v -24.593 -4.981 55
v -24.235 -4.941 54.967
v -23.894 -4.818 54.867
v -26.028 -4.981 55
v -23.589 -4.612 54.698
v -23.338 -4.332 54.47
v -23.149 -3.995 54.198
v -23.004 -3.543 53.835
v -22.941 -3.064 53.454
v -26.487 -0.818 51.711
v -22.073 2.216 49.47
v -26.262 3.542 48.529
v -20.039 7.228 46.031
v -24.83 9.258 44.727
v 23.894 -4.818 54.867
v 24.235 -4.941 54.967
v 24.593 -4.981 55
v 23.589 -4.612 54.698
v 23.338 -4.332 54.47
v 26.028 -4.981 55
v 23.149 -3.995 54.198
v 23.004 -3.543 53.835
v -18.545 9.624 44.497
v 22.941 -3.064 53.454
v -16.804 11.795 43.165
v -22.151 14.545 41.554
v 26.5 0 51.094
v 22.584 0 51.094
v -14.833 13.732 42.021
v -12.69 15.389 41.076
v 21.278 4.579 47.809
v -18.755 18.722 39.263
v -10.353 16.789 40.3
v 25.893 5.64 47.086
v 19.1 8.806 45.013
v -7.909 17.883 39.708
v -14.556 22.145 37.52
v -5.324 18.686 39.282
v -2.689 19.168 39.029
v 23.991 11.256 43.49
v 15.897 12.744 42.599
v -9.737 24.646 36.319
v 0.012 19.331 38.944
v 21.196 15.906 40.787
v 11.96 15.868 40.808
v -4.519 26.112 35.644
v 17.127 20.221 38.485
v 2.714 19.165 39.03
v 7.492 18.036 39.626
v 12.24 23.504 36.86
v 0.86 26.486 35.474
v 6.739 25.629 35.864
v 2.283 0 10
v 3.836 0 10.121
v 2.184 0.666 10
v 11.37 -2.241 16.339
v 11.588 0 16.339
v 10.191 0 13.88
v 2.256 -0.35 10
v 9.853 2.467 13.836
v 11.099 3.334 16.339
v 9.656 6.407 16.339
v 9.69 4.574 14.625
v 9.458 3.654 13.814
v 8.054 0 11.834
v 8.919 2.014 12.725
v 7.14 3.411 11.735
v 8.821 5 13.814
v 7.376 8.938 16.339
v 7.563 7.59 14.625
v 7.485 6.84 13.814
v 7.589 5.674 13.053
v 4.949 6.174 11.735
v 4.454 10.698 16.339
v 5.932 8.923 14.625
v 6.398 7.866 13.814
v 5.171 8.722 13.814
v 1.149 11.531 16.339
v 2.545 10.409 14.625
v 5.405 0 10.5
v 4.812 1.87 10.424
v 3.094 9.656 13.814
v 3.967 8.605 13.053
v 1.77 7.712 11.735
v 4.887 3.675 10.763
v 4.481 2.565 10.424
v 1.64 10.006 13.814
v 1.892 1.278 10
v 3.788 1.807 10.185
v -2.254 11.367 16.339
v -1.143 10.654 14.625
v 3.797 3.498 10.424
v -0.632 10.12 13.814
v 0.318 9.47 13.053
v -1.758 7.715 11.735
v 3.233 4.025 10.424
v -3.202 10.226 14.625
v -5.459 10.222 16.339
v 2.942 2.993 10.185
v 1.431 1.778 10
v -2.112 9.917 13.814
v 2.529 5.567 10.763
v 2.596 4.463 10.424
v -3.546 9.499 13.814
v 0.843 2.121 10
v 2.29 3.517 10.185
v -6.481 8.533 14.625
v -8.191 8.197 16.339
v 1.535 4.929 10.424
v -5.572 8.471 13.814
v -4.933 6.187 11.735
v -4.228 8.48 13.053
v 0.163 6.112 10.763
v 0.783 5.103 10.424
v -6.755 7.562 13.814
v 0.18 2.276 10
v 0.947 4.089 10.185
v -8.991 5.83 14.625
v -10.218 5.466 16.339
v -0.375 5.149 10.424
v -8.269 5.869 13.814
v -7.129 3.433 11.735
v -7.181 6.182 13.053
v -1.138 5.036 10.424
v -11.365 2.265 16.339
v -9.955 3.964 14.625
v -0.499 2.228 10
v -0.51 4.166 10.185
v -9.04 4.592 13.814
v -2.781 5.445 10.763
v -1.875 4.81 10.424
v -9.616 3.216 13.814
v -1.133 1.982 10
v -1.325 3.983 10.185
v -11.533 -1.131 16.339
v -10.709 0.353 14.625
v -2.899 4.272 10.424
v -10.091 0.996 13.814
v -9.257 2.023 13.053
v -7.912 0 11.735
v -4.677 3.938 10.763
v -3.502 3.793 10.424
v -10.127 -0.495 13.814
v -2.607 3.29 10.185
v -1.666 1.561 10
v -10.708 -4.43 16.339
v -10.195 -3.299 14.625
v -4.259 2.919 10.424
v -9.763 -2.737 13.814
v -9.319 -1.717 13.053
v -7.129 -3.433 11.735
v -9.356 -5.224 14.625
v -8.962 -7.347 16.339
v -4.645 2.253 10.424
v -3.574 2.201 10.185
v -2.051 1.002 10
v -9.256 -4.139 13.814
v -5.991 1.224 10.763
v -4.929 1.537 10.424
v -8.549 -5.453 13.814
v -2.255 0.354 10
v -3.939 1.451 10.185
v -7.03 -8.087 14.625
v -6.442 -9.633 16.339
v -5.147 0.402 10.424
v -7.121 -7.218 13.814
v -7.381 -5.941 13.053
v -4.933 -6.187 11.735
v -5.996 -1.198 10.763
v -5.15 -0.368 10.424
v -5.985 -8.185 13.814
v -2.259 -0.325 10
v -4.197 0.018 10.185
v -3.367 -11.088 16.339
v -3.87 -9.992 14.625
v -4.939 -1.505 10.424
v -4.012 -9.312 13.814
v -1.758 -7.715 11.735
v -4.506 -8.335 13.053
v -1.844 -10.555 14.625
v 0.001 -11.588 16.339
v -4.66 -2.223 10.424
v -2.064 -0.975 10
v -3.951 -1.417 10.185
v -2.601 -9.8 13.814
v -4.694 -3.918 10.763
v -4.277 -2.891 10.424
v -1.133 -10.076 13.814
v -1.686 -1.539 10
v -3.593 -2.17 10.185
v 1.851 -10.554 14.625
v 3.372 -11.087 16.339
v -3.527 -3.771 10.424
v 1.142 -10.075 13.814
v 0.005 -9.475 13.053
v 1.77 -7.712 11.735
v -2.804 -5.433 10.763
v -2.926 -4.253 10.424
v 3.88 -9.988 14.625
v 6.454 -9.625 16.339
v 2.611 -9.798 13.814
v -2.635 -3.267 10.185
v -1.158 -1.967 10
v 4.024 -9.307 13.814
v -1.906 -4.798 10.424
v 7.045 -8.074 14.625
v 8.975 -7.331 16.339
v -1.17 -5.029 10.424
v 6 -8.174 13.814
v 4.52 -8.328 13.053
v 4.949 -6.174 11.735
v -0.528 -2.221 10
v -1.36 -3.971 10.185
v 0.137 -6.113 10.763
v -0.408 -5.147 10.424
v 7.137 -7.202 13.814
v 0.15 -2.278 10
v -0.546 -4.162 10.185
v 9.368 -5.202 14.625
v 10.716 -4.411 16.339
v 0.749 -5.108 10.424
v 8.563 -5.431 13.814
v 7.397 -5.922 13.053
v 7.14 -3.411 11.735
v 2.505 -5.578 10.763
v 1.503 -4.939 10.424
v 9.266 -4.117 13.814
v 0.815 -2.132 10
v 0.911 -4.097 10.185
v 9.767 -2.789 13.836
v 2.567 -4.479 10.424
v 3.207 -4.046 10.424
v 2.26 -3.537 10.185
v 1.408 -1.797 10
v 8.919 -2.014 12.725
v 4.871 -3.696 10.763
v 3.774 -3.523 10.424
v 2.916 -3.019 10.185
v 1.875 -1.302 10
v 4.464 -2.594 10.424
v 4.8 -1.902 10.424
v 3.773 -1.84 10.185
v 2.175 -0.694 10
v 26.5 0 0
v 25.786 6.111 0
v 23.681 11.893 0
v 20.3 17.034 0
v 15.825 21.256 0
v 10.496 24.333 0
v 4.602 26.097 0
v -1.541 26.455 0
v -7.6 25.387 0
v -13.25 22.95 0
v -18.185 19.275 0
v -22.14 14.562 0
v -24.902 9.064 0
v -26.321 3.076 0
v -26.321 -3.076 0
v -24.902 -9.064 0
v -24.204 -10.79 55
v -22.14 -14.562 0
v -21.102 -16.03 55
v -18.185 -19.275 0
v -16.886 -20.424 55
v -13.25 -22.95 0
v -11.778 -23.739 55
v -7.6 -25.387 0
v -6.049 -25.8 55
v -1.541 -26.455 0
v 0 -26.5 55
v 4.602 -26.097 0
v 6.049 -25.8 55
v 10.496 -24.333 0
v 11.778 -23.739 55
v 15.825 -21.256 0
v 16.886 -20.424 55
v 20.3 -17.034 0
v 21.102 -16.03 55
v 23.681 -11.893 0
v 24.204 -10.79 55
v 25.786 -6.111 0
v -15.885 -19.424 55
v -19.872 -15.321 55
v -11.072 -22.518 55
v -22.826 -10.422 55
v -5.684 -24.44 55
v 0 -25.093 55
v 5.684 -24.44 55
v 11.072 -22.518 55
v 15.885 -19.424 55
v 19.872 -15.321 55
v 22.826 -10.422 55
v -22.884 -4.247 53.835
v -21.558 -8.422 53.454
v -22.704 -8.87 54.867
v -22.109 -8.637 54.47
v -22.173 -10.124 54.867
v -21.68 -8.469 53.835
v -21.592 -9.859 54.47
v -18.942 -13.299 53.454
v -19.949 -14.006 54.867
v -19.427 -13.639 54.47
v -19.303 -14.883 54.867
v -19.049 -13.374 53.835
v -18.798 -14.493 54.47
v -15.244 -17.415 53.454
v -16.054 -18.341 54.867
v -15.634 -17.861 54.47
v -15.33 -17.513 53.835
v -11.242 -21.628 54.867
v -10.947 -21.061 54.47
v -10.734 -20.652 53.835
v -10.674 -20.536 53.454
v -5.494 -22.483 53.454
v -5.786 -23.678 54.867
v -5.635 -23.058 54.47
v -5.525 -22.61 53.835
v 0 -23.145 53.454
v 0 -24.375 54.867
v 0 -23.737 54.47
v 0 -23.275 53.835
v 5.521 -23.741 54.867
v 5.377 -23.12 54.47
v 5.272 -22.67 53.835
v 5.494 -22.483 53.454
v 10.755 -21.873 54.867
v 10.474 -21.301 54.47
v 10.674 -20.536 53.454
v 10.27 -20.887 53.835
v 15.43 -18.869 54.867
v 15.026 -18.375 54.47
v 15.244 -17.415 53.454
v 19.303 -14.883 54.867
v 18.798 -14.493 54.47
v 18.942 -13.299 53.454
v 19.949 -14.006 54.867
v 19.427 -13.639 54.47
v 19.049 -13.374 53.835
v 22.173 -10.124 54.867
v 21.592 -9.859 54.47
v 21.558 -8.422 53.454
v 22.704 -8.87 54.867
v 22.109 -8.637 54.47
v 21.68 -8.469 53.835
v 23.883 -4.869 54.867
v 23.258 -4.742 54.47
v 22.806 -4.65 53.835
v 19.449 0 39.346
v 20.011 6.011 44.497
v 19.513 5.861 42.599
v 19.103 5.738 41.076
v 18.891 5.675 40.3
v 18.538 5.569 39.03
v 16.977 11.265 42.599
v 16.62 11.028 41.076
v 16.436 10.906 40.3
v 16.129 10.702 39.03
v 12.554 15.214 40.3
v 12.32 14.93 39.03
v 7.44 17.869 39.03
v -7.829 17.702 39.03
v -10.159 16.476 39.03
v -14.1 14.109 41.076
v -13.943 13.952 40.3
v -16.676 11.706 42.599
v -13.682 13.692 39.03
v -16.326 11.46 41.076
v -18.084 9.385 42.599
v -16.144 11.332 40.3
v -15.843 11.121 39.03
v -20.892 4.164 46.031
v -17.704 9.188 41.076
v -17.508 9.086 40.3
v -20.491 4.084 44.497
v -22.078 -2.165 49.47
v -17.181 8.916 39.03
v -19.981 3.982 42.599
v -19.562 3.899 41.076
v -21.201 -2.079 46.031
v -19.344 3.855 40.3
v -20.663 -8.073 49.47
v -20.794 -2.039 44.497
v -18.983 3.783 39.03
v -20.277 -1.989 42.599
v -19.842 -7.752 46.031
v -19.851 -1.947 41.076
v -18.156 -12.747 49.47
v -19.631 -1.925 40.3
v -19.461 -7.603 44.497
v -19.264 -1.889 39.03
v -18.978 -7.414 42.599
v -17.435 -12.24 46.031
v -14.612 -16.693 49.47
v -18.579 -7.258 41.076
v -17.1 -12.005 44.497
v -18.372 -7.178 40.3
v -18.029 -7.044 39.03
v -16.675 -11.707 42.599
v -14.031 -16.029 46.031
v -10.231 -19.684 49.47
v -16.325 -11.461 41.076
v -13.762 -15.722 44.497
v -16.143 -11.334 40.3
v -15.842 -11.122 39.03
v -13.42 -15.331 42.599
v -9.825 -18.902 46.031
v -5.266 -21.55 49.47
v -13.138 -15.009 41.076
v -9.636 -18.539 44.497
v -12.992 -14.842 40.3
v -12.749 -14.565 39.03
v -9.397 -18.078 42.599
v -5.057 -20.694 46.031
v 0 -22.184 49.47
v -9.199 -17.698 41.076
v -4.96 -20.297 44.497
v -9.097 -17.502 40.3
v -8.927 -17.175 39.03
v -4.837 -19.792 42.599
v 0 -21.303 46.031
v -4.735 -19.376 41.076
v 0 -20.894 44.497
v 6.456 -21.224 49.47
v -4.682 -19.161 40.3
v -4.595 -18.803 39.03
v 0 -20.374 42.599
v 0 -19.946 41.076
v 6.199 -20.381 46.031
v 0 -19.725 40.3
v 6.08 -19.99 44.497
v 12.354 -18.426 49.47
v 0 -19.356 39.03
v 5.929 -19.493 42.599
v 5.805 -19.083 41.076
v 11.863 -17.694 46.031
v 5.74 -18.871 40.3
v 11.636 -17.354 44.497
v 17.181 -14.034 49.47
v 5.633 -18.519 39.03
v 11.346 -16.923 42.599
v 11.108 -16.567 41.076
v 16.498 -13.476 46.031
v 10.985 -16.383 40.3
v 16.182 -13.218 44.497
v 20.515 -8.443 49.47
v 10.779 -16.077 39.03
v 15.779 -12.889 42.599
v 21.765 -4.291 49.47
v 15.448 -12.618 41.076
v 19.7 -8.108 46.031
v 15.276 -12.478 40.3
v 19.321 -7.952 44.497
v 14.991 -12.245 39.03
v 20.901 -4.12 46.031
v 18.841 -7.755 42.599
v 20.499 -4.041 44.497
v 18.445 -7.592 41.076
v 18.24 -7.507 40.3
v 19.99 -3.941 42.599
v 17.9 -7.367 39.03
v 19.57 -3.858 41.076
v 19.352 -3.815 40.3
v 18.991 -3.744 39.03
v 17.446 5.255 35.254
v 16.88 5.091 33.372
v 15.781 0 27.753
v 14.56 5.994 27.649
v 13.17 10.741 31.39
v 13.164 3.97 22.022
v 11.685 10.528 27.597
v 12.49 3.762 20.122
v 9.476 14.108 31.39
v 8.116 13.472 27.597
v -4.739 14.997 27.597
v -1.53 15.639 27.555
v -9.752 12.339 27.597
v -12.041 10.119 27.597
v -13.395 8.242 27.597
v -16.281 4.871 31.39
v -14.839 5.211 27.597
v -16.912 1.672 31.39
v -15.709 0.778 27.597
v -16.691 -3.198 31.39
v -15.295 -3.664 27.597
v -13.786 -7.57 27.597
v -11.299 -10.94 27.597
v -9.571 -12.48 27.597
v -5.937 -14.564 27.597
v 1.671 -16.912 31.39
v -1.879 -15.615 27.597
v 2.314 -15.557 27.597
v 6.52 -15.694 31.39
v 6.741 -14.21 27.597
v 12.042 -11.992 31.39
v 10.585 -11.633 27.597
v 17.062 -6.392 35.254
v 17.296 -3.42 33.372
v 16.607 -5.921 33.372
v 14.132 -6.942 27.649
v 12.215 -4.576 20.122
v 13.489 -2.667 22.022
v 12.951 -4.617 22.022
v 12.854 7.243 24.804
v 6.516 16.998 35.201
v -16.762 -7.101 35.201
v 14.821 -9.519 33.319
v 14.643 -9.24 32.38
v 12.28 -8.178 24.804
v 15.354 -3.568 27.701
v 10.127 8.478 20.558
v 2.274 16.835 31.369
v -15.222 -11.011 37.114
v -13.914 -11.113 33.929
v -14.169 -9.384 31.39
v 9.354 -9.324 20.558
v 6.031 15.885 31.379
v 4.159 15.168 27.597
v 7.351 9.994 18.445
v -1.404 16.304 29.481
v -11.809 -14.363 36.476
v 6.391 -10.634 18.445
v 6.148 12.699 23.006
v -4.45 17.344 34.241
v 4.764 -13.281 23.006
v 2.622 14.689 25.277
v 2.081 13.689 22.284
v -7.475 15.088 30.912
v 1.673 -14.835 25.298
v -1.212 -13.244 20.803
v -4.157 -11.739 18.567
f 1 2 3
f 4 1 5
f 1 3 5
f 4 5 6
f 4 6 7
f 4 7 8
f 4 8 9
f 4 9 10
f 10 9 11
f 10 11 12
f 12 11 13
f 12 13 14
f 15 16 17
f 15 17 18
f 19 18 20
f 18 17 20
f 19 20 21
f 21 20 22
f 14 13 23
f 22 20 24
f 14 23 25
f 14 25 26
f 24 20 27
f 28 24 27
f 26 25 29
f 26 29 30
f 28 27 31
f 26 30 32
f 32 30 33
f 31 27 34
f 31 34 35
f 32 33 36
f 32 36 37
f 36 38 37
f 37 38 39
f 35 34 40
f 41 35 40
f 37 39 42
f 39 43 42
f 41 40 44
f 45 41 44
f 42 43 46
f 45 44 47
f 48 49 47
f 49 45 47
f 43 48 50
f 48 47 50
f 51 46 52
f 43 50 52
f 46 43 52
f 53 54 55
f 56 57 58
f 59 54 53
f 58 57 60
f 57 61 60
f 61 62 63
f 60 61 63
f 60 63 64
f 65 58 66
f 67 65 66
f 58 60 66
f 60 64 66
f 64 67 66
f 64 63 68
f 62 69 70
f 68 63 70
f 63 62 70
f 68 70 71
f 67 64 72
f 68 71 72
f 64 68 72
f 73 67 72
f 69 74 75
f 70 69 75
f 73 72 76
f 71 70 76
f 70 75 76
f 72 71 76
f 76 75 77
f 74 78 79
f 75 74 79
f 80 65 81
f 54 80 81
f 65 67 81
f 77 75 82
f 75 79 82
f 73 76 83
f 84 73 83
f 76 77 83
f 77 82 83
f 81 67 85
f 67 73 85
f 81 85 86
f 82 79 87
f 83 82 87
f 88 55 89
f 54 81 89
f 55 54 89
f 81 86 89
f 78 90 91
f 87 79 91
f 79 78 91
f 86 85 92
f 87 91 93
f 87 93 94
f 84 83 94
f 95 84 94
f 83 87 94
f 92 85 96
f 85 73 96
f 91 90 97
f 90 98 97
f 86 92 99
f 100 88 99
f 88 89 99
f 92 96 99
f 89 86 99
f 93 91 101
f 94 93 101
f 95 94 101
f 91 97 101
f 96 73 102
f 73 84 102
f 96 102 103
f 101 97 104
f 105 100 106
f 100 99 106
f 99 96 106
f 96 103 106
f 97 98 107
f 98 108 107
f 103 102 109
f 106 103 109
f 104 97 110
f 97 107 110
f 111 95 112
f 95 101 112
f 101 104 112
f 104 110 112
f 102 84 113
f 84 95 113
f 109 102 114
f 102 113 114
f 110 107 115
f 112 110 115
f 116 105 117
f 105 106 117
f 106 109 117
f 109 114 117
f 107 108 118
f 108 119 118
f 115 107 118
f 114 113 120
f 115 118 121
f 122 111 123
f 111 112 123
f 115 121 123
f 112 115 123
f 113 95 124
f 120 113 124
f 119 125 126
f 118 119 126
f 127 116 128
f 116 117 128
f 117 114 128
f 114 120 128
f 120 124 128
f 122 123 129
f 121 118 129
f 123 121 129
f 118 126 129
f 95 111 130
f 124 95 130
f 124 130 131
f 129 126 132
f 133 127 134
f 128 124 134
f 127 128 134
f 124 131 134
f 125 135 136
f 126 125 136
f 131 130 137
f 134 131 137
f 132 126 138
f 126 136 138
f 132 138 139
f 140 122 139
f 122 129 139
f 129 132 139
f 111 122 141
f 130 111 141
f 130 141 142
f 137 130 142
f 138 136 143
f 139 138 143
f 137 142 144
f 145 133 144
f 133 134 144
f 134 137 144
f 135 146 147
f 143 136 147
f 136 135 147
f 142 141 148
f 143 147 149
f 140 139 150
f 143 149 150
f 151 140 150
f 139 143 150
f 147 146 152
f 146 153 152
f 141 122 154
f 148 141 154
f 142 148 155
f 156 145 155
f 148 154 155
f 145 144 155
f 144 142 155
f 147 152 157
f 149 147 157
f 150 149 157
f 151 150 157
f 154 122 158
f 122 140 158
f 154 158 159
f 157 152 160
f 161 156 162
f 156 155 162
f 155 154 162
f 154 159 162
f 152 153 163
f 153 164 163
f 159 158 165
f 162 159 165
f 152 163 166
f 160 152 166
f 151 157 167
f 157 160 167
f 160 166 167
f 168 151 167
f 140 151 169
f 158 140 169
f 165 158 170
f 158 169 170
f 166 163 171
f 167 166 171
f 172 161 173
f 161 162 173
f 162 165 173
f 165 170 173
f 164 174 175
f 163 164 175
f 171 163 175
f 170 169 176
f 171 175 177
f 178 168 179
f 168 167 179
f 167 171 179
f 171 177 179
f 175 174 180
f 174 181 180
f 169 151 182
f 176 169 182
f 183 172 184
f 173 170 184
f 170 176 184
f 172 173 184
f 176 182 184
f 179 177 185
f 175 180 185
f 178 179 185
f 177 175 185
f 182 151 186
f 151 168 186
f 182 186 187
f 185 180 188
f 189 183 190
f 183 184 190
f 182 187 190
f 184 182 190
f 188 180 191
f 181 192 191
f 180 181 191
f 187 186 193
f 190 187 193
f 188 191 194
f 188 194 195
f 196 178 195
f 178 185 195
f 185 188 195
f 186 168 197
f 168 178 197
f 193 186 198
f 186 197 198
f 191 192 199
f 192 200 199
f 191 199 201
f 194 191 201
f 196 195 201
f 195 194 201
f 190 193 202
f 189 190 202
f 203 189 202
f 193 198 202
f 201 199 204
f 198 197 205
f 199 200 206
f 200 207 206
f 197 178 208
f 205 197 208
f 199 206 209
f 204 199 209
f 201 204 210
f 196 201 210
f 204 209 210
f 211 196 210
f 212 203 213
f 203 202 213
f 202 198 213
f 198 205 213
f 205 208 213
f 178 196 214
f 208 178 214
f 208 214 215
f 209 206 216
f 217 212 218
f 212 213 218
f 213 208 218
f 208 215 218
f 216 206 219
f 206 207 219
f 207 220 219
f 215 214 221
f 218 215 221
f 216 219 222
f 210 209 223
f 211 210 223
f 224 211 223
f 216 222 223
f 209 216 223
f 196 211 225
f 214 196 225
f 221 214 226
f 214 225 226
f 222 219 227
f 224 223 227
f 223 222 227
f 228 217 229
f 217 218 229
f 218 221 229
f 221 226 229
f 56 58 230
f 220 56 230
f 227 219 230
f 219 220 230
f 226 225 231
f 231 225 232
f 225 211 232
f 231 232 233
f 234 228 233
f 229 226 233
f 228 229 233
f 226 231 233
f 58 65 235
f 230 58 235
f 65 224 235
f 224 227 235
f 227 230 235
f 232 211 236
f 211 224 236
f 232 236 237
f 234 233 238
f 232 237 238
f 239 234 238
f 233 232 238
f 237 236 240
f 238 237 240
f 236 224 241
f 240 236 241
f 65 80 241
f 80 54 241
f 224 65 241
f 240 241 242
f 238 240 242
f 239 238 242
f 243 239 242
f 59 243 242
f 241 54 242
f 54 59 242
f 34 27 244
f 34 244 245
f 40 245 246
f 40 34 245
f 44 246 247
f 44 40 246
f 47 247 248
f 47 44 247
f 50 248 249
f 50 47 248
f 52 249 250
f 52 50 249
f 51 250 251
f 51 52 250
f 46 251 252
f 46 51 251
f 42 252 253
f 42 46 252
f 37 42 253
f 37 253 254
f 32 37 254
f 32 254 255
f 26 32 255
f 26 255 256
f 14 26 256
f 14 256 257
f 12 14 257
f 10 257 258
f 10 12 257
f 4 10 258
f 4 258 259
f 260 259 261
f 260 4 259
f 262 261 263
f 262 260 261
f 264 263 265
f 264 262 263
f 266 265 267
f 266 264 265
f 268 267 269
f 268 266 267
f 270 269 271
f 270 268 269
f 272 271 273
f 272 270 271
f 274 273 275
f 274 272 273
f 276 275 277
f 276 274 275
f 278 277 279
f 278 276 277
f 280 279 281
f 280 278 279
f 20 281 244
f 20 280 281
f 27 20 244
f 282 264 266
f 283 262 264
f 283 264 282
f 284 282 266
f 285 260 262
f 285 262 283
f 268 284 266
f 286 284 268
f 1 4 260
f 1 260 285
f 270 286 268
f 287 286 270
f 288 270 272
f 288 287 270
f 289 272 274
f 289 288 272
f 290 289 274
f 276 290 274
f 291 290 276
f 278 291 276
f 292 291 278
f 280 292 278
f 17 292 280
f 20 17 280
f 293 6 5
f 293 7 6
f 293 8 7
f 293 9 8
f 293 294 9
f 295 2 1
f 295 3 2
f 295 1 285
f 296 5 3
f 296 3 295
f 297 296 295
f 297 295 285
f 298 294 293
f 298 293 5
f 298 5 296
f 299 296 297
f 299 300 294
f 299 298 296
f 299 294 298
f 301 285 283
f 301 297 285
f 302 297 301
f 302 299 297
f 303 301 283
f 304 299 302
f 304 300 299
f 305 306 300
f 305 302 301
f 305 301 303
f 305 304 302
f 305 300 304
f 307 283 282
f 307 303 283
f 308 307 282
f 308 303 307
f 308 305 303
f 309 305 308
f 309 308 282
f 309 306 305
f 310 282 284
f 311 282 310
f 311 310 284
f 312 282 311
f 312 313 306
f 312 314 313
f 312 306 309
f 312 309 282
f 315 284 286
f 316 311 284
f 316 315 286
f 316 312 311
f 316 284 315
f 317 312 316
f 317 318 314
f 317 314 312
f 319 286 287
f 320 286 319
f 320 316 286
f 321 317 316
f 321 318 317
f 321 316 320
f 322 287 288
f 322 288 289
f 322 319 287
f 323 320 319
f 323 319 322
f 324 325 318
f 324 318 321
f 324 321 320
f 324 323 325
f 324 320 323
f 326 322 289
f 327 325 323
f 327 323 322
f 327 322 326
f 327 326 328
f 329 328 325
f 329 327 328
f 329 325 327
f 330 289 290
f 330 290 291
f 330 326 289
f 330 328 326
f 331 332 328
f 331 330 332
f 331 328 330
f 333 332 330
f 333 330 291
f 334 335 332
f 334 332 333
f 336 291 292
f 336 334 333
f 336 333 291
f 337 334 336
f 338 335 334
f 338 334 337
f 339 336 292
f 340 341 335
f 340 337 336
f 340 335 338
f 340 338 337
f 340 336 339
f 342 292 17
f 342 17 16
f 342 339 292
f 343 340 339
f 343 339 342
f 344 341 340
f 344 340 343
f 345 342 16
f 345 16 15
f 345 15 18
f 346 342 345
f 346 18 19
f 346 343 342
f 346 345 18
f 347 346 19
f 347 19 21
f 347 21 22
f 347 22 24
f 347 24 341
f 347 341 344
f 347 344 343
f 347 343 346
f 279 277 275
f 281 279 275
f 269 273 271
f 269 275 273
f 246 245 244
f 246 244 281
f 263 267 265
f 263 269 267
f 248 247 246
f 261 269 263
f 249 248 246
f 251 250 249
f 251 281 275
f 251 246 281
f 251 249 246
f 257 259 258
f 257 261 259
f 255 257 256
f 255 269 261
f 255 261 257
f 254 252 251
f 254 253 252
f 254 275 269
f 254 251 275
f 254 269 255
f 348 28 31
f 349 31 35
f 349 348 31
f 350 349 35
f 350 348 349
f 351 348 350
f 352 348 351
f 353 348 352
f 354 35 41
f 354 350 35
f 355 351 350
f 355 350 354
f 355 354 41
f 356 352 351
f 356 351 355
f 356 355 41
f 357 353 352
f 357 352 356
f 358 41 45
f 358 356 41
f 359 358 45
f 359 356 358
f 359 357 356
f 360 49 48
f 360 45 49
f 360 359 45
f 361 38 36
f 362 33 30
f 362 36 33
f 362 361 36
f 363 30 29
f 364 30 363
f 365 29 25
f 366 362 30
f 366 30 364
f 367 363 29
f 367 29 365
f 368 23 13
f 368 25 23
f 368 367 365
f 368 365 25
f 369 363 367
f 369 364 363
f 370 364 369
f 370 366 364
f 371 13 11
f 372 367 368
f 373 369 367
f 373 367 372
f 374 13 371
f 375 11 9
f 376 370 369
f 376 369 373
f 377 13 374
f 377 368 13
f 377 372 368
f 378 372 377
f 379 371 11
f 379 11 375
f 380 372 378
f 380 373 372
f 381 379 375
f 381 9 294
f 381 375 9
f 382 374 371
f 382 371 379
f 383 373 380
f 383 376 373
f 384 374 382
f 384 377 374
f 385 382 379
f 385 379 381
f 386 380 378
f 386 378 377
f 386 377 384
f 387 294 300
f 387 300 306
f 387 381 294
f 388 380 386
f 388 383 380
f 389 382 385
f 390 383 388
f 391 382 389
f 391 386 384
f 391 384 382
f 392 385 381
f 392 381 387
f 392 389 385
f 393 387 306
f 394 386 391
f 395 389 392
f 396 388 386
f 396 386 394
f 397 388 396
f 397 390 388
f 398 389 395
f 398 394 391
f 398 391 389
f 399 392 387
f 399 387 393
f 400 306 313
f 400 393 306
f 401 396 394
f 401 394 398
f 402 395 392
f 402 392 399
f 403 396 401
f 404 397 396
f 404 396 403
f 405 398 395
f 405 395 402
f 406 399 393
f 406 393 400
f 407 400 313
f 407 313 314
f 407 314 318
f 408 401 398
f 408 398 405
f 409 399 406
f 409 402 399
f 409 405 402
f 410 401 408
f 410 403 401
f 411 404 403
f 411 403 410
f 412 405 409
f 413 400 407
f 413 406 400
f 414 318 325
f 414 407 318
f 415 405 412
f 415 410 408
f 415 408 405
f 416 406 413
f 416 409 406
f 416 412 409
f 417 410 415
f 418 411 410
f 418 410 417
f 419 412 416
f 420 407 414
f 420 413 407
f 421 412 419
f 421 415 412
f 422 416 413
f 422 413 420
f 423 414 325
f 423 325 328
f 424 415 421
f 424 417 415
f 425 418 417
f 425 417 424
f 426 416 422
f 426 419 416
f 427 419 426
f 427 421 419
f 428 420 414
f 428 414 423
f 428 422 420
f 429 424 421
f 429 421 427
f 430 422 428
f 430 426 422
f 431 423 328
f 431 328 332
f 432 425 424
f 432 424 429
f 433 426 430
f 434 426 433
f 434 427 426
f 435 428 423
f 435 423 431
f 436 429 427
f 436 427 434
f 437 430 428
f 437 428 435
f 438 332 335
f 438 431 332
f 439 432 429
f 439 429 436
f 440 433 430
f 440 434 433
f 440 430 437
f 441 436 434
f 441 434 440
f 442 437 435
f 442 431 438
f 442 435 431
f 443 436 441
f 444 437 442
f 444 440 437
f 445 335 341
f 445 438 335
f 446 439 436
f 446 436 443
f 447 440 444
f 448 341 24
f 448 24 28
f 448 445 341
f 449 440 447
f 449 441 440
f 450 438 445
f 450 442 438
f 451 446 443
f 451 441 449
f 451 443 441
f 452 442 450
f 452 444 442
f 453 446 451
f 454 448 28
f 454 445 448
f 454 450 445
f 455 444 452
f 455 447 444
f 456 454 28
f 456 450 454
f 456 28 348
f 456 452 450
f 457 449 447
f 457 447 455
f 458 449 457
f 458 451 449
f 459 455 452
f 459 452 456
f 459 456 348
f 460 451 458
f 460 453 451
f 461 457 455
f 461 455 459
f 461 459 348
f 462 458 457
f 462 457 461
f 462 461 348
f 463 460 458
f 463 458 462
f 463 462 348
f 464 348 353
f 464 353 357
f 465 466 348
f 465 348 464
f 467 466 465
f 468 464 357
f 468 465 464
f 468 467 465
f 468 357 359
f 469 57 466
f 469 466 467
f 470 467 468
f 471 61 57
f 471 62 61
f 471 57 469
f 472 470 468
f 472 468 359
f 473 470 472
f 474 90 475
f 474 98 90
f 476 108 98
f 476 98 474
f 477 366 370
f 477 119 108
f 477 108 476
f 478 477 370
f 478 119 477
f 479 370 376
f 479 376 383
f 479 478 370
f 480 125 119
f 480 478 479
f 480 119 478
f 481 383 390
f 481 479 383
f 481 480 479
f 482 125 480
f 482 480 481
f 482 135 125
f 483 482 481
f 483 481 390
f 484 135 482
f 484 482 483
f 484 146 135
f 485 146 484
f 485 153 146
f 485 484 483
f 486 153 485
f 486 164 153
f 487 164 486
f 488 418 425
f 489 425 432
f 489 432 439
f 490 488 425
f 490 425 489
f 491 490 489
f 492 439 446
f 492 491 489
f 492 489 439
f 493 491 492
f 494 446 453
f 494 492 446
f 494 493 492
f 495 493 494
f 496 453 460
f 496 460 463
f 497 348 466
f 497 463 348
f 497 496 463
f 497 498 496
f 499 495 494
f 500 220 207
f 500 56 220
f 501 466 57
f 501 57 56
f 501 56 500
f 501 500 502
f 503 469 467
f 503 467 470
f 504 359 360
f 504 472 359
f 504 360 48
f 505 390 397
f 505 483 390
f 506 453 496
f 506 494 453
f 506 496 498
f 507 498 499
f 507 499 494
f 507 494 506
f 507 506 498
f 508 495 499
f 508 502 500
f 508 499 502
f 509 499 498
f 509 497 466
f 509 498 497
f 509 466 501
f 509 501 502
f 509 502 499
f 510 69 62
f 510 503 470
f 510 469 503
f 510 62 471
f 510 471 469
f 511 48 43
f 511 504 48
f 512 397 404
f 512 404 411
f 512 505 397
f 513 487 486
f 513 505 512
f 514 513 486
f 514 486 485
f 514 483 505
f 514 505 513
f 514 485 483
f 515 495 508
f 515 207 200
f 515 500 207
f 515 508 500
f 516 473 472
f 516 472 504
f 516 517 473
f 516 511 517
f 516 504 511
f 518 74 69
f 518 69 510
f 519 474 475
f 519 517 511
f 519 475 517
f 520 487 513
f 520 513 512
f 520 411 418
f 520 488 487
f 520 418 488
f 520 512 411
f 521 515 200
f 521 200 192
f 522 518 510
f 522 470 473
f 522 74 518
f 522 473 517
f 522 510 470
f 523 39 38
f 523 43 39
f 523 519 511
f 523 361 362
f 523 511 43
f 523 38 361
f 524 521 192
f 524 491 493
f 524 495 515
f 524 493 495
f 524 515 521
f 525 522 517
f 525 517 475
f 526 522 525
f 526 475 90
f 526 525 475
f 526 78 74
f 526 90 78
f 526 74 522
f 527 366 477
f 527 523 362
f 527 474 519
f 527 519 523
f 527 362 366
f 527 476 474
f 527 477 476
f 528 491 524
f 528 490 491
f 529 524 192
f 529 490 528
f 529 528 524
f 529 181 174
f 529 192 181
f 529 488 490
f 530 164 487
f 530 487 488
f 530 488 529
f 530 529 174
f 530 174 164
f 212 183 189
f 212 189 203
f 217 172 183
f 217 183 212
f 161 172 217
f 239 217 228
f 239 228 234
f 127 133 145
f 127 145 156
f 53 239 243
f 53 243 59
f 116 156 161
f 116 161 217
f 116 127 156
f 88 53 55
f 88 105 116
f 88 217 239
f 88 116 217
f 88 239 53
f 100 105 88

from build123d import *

# Parameters (mm, degrees)
F3_DEPTH = 52.81897
F4_R     = 10


with BuildPart() as f1:
    # F0 (on Front) → F1 (revolve)
    with BuildSketch(Plane.XZ):
        with BuildLine():
            Line((0, 10), (0, 0))
            Line((0, 0), (26.5, 0))
            Line((26.5, 0), (26.5, 55))
            Line((26.5, 55), (25.092501, 55))
            ThreePointArc((25.092501, 55), (23.849016, 54.566444), (23.144652, 53.453747))
            ThreePointArc((23.144652, 53.453747), (17.005279, 31.423188), (9, 10))
            Line((9, 10), (0, 10))
        make_face()
    revolve(axis=Axis((0, 0, 17.288097), (0, 0, 1)))

    # F2 (on Right) → F3 (cut, symmetric)
    with BuildSketch(Plane.YZ):
        with BuildLine():
            ThreePointArc((-4.980726, 55), (144.261109, 36.559124), (224.721762, 163.59957))
            ThreePointArc((224.721762, 163.59957), (24.13583, 290.640016), (-4.980726, 55))
        make_face()
    extrude(amount=F3_DEPTH, both=True, mode=Mode.SUBTRACT)

    # F4
    f4_edges = [f1.edges().sort_by_distance(p)[0] for p in [
        (-9, 0, 10),
    ]]
    fillet(f4_edges, radius=F4_R)


solid = f1.part
